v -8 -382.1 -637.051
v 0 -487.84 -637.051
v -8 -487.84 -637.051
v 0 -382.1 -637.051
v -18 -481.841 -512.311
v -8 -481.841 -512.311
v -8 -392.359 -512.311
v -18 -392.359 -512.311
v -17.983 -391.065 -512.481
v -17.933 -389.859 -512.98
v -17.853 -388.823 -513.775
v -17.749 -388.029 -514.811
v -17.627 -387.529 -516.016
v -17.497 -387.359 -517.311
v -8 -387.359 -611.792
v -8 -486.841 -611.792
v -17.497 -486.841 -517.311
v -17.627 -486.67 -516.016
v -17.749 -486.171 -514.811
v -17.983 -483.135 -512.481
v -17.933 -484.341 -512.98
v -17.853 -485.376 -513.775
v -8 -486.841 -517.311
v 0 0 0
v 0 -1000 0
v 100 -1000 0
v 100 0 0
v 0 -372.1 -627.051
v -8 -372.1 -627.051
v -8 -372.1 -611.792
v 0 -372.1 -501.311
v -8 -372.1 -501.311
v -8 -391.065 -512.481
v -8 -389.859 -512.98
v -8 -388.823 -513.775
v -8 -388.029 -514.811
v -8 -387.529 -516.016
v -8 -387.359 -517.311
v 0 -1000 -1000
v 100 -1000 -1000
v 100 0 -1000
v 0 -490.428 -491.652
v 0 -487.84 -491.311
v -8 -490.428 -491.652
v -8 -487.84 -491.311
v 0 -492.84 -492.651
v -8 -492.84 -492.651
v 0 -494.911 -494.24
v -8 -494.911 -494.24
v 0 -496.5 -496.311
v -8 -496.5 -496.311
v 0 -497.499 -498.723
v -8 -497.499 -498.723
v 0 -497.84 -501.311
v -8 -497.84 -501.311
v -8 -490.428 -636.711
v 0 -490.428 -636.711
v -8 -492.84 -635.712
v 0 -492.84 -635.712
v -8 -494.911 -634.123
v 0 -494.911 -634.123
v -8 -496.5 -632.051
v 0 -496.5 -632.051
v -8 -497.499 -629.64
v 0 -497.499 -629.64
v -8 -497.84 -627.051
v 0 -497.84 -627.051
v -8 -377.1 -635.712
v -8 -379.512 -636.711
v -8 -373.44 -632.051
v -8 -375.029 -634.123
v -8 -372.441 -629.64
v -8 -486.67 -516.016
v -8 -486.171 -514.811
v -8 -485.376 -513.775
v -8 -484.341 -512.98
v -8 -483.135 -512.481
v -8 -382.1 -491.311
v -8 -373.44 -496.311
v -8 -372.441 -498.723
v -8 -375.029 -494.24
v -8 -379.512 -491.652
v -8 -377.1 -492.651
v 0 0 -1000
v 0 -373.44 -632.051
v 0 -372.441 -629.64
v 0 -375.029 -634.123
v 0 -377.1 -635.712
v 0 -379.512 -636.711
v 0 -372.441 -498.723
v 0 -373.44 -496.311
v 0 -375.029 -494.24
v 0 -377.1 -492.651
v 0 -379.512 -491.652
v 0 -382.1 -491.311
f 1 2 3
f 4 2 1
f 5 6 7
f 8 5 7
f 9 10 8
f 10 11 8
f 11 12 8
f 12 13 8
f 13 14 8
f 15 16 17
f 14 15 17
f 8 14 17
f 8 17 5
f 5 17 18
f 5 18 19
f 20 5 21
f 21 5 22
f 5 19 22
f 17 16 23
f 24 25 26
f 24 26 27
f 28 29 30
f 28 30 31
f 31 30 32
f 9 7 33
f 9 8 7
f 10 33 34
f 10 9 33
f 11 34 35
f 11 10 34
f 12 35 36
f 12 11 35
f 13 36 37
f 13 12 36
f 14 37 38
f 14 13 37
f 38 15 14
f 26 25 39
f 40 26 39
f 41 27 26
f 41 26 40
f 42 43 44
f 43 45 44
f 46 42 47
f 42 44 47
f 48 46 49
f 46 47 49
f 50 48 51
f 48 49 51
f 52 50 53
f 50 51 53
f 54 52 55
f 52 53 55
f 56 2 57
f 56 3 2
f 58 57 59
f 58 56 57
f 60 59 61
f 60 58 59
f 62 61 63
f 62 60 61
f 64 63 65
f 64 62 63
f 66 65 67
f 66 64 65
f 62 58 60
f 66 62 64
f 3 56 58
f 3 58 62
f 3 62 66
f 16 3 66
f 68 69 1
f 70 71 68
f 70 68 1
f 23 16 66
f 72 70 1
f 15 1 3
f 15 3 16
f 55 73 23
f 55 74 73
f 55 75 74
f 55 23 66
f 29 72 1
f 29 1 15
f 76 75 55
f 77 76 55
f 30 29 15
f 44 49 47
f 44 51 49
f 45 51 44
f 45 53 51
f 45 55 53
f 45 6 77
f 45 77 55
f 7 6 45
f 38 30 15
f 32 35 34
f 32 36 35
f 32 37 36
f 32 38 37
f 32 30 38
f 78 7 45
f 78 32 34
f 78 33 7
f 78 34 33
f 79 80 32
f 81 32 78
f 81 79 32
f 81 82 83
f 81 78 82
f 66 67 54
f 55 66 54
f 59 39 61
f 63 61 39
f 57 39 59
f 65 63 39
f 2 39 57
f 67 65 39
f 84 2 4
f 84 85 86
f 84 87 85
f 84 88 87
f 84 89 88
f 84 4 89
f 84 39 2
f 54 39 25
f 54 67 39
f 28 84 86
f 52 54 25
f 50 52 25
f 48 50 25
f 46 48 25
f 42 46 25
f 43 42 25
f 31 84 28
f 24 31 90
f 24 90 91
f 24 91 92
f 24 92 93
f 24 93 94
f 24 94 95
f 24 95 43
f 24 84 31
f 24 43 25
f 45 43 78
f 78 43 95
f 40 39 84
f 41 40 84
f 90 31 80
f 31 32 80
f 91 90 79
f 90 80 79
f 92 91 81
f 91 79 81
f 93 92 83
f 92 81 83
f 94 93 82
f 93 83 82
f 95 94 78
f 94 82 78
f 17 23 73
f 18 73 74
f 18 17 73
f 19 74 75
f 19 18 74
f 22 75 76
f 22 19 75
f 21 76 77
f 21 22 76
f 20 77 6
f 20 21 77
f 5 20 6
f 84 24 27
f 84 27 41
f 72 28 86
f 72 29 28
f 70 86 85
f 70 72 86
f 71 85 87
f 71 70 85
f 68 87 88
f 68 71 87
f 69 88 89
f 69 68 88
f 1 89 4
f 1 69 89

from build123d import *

# Parameters (mm, degrees)
SKETCH2_W           = 1000
SKETCH2_H           = 1000
BOSS_EXTRUDE2_DEPTH = 100
SKETCH4_W           = 145.74
SKETCH4_H           = 135.74
BOSS_EXTRUDE4_DEPTH = 8
FILLET1_R           = 10
SKETCH11_W          = 99.481944883
SKETCH11_H          = 99.481944883
BOSS_EXTRUDE6_DEPTH = 10
CUT_EXTRUDE2_DEPTH  = 199
FILLET5_R           = 5
SKETCH13_W          = 145.74
SKETCH13_H          = 10.277158346
CUT_EXTRUDE3_DEPTH  = 8
FILLET6_R           = 10


with BuildPart() as part:
    # Sketch2 → Boss-Extrude2 (new body)
    with BuildSketch(Plane(origin=(0, 0, 0), x_dir=(0, 0, -1), z_dir=(1, 0, 0))):
        with Locations((500, -500)):
            Rectangle(SKETCH2_W, SKETCH2_H)
    extrude(amount=BOSS_EXTRUDE2_DEPTH)

    # Sketch4 → Boss-Extrude4 (add)
    with BuildSketch(Plane.ZY):
        with Locations((-564.181498588, -429.969817094)):
            Rectangle(SKETCH4_W, SKETCH4_H)
    extrude(amount=BOSS_EXTRUDE4_DEPTH)

    # Fillet1
    fillet1_edges = [part.edges().sort_by_distance(p)[0] for p in [
        (-4, -362.099817094, -491.311498588),
        (-4, -362.099817094, -637.051498588),
        (-4, -497.839817094, -637.051498588),
        (-4, -497.839817094, -491.311498588),
    ]]
    fillet(fillet1_edges, radius=FILLET1_R)

    # Sketch11 → Boss-Extrude6 (add)
    with BuildSketch(Plane.ZY.offset(8)):
        with Locations((-562.051498588, -437.099817095)):
            Rectangle(SKETCH11_W, SKETCH11_H)
    extrude(amount=BOSS_EXTRUDE6_DEPTH)

    # Sketch12 → Cut-Extrude2 (cut)
    with BuildSketch(Plane(origin=(0, -486.840789536, 0), x_dir=(-1, 0, 0), z_dir=(0, -1, 0))):
        Polygon((8, 611.79247103), (18, 512.310526147), (18, 611.79247103), align=None)
    extrude(amount=-CUT_EXTRUDE2_DEPTH, mode=Mode.SUBTRACT)

    # Fillet5
    fillet5_edges = [part.edges().sort_by_distance(p)[0] for p in [
        (-13, -387.358844653, -512.310526147),
        (-13, -486.840789536, -512.310526147),
    ]]
    fillet(fillet5_edges, radius=FILLET5_R)

    # Sketch13 → Cut-Extrude3 (cut)
    with BuildSketch(Plane.ZY.offset(8)):
        with Locations((-564.181498588, -366.961237921)):
            Rectangle(SKETCH13_W, SKETCH13_H)
    extrude(amount=-CUT_EXTRUDE3_DEPTH, mode=Mode.SUBTRACT)

    # Fillet6
    fillet6_edges = [part.edges().sort_by_distance(p)[0] for p in [
        (-4, -372.099817094, -491.311498588),
        (-4, -372.099817094, -637.051498588),
    ]]
    fillet(fillet6_edges, radius=FILLET6_R)


solid = part.part
